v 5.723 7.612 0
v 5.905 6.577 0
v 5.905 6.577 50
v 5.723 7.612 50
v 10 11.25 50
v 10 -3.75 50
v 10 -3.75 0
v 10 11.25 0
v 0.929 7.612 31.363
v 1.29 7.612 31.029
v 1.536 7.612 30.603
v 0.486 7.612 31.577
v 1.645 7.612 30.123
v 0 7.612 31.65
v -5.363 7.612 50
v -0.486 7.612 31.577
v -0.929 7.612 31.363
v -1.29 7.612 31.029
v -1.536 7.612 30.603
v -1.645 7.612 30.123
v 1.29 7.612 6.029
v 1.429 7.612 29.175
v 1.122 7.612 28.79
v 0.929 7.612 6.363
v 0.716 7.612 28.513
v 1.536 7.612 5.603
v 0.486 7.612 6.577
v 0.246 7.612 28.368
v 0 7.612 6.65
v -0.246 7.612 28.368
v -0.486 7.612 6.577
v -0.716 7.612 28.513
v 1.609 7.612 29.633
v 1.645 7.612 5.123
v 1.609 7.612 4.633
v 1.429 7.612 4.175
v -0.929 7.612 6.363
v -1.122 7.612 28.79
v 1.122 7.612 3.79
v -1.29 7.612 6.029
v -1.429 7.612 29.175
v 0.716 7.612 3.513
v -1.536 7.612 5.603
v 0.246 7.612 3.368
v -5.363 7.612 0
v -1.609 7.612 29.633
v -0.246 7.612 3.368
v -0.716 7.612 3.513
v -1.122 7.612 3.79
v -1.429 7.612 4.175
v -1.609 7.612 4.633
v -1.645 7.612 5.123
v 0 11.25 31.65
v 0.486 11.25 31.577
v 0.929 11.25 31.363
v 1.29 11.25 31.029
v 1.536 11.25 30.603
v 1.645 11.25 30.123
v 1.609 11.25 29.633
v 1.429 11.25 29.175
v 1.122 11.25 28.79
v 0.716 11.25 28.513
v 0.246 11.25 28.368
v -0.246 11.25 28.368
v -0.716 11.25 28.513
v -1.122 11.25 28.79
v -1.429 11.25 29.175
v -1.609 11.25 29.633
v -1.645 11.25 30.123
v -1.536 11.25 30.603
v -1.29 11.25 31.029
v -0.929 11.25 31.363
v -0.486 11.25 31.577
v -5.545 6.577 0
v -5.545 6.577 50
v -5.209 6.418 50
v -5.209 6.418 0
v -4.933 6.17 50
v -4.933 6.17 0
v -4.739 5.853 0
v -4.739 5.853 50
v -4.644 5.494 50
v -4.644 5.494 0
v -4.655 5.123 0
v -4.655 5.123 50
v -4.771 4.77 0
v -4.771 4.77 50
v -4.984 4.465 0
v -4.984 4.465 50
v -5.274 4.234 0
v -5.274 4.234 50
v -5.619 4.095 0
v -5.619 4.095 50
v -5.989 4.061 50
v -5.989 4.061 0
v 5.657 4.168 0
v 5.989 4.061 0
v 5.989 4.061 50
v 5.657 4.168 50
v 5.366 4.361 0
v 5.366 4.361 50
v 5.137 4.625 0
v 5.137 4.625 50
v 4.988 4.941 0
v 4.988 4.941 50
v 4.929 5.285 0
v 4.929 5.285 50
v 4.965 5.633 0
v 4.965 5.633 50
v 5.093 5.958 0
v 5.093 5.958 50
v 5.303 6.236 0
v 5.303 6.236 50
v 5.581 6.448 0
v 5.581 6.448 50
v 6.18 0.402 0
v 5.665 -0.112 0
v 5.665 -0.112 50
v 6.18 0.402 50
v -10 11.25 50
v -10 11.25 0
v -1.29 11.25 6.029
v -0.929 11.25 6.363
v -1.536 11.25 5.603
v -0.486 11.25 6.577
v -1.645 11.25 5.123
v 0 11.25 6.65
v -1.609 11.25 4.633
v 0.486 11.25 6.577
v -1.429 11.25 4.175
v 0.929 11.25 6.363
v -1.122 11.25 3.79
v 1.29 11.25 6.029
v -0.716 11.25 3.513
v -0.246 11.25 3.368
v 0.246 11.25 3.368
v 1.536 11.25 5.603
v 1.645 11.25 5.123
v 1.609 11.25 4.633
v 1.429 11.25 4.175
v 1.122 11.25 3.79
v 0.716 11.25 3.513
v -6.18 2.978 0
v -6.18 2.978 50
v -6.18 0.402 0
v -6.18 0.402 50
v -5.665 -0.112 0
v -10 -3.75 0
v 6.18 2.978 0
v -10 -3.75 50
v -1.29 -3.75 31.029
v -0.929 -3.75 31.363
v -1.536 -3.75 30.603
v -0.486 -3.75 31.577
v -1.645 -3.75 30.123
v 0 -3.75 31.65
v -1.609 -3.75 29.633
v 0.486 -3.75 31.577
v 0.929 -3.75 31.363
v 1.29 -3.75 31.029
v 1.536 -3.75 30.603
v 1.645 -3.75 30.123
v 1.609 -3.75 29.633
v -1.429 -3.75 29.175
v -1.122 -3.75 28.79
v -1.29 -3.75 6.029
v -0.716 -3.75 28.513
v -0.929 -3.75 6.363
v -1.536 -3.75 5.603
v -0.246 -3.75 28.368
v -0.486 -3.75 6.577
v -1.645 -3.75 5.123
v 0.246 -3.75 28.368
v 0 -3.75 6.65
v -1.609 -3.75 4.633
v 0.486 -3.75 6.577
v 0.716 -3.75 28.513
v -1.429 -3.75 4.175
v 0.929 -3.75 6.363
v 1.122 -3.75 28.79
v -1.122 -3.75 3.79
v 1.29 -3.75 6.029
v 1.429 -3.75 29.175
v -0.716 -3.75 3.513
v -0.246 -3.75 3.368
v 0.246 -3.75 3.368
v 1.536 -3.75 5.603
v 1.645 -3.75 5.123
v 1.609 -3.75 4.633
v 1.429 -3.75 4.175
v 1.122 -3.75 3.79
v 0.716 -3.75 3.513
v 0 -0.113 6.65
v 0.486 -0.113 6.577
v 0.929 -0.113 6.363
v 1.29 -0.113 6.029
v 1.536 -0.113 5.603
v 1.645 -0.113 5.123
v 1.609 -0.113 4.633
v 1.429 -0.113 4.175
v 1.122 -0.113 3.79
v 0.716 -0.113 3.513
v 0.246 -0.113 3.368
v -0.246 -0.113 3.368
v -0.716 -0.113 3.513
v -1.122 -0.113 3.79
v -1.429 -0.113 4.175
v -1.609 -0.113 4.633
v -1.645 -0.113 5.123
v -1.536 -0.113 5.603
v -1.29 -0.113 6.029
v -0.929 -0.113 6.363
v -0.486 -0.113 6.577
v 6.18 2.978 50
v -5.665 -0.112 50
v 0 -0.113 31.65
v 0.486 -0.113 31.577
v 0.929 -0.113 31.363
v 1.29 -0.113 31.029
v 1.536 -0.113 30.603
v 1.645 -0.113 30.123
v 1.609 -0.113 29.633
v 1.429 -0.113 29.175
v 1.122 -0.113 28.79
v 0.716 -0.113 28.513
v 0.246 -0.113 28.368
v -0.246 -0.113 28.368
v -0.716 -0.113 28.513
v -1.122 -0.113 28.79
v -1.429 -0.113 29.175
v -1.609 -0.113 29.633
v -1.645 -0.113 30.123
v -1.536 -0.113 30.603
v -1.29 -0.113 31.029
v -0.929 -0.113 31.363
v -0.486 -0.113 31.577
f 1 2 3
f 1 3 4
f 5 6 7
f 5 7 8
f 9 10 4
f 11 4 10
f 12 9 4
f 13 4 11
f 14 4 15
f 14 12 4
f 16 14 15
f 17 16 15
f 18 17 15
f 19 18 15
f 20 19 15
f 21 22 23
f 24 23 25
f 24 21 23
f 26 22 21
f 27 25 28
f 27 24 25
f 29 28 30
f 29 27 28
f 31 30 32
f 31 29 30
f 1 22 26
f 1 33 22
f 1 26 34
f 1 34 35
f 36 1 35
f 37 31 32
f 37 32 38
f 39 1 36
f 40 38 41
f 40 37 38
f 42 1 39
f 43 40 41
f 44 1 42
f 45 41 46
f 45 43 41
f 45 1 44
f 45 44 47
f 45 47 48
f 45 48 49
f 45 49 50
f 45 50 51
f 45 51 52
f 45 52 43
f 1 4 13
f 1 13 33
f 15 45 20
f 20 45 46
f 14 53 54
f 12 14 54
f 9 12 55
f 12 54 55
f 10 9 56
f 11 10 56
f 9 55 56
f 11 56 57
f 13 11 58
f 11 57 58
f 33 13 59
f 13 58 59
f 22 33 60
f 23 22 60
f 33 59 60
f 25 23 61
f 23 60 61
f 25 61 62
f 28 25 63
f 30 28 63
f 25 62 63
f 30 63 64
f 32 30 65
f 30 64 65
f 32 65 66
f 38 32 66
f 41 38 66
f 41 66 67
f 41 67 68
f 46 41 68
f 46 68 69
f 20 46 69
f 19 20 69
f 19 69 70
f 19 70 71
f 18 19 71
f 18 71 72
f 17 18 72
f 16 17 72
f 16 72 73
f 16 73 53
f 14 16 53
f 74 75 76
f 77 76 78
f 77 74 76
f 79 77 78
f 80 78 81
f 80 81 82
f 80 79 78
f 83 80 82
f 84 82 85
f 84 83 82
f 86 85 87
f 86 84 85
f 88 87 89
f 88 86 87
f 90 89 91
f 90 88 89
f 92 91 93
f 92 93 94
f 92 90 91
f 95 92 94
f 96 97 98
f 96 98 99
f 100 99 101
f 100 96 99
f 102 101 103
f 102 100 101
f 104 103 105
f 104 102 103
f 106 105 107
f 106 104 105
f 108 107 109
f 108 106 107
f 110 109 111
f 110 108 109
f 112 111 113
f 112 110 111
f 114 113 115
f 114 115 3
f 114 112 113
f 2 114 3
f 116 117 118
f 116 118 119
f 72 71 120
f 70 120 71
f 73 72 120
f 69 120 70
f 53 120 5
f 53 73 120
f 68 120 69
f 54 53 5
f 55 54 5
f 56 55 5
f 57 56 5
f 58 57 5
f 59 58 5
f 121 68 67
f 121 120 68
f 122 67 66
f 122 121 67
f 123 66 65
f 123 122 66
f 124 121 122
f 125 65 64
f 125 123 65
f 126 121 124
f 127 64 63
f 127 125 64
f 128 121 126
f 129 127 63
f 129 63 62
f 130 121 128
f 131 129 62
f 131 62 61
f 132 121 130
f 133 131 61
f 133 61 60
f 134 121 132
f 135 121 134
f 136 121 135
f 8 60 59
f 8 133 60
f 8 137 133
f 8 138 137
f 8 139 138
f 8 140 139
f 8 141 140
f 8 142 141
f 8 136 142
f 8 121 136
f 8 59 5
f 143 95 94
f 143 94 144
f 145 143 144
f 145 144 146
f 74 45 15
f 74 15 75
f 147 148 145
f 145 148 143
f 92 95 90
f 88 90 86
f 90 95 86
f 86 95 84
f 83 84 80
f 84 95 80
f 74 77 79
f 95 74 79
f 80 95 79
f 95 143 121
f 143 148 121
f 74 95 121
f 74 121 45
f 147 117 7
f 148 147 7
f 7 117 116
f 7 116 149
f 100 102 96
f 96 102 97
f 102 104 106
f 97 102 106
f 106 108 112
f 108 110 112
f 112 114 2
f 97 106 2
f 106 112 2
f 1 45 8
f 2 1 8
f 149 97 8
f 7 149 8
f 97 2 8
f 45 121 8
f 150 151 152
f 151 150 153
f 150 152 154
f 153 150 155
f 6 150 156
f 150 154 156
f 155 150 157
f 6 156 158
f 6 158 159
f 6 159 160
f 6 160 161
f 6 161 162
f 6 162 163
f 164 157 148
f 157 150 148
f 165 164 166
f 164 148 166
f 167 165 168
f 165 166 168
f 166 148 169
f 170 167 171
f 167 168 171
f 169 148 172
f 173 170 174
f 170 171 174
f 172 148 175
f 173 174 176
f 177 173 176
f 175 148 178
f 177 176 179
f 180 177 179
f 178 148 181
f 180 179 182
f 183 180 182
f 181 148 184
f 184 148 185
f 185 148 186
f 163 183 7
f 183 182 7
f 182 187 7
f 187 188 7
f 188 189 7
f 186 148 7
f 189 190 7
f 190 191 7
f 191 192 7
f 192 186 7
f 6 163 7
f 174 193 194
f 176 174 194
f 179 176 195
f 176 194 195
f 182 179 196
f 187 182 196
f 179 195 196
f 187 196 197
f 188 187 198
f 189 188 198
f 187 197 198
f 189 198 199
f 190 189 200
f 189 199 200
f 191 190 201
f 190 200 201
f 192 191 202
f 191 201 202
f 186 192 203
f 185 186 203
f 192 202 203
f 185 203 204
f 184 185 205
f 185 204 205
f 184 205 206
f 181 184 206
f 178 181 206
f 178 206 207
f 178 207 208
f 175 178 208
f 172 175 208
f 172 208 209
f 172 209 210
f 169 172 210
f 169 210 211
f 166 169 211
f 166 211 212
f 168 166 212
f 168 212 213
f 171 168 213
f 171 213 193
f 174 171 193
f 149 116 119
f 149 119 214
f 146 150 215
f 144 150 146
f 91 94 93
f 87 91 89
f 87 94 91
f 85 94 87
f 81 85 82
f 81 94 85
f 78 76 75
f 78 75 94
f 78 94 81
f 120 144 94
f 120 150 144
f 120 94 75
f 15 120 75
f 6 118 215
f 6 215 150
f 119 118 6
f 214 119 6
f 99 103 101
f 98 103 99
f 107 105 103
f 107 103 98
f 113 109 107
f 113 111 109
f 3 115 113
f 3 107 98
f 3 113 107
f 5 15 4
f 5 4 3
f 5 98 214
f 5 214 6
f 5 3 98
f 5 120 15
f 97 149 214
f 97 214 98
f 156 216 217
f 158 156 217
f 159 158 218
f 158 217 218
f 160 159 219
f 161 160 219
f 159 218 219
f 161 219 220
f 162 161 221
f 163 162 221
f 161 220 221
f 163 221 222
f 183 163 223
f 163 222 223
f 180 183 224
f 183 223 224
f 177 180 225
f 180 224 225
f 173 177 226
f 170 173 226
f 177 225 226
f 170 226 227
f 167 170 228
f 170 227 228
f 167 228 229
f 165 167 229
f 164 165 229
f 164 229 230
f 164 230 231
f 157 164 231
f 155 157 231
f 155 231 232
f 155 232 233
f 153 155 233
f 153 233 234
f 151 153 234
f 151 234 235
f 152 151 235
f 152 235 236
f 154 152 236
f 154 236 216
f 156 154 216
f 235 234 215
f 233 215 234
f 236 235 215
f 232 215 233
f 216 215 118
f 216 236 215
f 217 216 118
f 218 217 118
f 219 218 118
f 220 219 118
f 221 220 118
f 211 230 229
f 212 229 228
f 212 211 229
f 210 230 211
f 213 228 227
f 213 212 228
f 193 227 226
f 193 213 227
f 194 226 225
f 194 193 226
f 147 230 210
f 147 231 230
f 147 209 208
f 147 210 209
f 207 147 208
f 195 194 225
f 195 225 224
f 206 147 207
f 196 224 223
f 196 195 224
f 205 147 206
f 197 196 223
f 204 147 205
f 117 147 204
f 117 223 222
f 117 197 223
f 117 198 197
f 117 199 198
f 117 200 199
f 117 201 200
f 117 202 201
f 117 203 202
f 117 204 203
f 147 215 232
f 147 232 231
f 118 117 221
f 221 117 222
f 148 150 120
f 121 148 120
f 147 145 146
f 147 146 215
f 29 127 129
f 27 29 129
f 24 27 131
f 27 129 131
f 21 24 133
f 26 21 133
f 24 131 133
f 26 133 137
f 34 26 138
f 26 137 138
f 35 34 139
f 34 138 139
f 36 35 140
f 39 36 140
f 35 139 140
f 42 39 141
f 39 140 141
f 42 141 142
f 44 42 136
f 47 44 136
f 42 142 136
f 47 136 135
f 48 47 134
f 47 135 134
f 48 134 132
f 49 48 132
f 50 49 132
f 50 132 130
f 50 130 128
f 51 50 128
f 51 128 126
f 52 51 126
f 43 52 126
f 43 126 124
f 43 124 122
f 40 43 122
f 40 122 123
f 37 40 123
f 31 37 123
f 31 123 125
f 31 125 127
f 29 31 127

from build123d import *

# Parameters (mm, degrees)
SKETCH2_W           = 20
SKETCH2_H           = 15
BOSS_EXTRUDE1_DEPTH = 50
SKETCH3_R           = 1.65
CUT_EXTRUDE1_DEPTH  = 54.150729064


with BuildPart() as part:
    # Sketch2 → Boss-Extrude1 (new body)
    with BuildSketch(Plane.XY):
        with Locations((0, 3.75)):
            Rectangle(SKETCH2_W, SKETCH2_H)
        with BuildLine():
            Line((6.18, 0.4025), (6.18, 2.9775))
            Line((6.18, 2.9775), (5.988999354, 4.060718492))
            ThreePointArc((5.988999354, 4.060718492), (4.929202717, 5.285218638), (5.905225776, 6.577483513))
            Line((5.905225776, 6.577483513), (5.722724444, 7.6125))
            Line((5.722724444, 7.6125), (-5.362724444, 7.6125))
            Line((-5.362724444, 7.6125), (-5.545225776, 6.577483513))
            ThreePointArc((-5.545225776, 6.577483513), (-4.654560018, 5.122927971), (-5.988999354, 4.060718492))
            Line((-5.988999354, 4.060718492), (-6.18, 2.9775))
            Line((-6.18, 2.9775), (-6.18, 0.4025))
            Line((-6.18, 0.4025), (-5.665, -0.1125))
            Line((-5.665, -0.1125), (5.665, -0.1125))
            Line((5.665, -0.1125), (6.18, 0.4025))
        make_face(mode=Mode.SUBTRACT)
    extrude(amount=BOSS_EXTRUDE1_DEPTH)

    # Sketch3 → Cut-Extrude1 (cut, through all)
    with BuildSketch(Plane(origin=(0, 11.25, 0), x_dir=(1, 0, 0), z_dir=(0, 1, 0))):
        with Locations(Location((0, -5, 0), (0, 0, 270))):
            Circle(SKETCH3_R)
        with Locations(Location((0, -30, 0), (0, 0, 270))):
            Circle(SKETCH3_R)
    extrude(amount=-CUT_EXTRUDE1_DEPTH, mode=Mode.SUBTRACT)


solid = part.part
